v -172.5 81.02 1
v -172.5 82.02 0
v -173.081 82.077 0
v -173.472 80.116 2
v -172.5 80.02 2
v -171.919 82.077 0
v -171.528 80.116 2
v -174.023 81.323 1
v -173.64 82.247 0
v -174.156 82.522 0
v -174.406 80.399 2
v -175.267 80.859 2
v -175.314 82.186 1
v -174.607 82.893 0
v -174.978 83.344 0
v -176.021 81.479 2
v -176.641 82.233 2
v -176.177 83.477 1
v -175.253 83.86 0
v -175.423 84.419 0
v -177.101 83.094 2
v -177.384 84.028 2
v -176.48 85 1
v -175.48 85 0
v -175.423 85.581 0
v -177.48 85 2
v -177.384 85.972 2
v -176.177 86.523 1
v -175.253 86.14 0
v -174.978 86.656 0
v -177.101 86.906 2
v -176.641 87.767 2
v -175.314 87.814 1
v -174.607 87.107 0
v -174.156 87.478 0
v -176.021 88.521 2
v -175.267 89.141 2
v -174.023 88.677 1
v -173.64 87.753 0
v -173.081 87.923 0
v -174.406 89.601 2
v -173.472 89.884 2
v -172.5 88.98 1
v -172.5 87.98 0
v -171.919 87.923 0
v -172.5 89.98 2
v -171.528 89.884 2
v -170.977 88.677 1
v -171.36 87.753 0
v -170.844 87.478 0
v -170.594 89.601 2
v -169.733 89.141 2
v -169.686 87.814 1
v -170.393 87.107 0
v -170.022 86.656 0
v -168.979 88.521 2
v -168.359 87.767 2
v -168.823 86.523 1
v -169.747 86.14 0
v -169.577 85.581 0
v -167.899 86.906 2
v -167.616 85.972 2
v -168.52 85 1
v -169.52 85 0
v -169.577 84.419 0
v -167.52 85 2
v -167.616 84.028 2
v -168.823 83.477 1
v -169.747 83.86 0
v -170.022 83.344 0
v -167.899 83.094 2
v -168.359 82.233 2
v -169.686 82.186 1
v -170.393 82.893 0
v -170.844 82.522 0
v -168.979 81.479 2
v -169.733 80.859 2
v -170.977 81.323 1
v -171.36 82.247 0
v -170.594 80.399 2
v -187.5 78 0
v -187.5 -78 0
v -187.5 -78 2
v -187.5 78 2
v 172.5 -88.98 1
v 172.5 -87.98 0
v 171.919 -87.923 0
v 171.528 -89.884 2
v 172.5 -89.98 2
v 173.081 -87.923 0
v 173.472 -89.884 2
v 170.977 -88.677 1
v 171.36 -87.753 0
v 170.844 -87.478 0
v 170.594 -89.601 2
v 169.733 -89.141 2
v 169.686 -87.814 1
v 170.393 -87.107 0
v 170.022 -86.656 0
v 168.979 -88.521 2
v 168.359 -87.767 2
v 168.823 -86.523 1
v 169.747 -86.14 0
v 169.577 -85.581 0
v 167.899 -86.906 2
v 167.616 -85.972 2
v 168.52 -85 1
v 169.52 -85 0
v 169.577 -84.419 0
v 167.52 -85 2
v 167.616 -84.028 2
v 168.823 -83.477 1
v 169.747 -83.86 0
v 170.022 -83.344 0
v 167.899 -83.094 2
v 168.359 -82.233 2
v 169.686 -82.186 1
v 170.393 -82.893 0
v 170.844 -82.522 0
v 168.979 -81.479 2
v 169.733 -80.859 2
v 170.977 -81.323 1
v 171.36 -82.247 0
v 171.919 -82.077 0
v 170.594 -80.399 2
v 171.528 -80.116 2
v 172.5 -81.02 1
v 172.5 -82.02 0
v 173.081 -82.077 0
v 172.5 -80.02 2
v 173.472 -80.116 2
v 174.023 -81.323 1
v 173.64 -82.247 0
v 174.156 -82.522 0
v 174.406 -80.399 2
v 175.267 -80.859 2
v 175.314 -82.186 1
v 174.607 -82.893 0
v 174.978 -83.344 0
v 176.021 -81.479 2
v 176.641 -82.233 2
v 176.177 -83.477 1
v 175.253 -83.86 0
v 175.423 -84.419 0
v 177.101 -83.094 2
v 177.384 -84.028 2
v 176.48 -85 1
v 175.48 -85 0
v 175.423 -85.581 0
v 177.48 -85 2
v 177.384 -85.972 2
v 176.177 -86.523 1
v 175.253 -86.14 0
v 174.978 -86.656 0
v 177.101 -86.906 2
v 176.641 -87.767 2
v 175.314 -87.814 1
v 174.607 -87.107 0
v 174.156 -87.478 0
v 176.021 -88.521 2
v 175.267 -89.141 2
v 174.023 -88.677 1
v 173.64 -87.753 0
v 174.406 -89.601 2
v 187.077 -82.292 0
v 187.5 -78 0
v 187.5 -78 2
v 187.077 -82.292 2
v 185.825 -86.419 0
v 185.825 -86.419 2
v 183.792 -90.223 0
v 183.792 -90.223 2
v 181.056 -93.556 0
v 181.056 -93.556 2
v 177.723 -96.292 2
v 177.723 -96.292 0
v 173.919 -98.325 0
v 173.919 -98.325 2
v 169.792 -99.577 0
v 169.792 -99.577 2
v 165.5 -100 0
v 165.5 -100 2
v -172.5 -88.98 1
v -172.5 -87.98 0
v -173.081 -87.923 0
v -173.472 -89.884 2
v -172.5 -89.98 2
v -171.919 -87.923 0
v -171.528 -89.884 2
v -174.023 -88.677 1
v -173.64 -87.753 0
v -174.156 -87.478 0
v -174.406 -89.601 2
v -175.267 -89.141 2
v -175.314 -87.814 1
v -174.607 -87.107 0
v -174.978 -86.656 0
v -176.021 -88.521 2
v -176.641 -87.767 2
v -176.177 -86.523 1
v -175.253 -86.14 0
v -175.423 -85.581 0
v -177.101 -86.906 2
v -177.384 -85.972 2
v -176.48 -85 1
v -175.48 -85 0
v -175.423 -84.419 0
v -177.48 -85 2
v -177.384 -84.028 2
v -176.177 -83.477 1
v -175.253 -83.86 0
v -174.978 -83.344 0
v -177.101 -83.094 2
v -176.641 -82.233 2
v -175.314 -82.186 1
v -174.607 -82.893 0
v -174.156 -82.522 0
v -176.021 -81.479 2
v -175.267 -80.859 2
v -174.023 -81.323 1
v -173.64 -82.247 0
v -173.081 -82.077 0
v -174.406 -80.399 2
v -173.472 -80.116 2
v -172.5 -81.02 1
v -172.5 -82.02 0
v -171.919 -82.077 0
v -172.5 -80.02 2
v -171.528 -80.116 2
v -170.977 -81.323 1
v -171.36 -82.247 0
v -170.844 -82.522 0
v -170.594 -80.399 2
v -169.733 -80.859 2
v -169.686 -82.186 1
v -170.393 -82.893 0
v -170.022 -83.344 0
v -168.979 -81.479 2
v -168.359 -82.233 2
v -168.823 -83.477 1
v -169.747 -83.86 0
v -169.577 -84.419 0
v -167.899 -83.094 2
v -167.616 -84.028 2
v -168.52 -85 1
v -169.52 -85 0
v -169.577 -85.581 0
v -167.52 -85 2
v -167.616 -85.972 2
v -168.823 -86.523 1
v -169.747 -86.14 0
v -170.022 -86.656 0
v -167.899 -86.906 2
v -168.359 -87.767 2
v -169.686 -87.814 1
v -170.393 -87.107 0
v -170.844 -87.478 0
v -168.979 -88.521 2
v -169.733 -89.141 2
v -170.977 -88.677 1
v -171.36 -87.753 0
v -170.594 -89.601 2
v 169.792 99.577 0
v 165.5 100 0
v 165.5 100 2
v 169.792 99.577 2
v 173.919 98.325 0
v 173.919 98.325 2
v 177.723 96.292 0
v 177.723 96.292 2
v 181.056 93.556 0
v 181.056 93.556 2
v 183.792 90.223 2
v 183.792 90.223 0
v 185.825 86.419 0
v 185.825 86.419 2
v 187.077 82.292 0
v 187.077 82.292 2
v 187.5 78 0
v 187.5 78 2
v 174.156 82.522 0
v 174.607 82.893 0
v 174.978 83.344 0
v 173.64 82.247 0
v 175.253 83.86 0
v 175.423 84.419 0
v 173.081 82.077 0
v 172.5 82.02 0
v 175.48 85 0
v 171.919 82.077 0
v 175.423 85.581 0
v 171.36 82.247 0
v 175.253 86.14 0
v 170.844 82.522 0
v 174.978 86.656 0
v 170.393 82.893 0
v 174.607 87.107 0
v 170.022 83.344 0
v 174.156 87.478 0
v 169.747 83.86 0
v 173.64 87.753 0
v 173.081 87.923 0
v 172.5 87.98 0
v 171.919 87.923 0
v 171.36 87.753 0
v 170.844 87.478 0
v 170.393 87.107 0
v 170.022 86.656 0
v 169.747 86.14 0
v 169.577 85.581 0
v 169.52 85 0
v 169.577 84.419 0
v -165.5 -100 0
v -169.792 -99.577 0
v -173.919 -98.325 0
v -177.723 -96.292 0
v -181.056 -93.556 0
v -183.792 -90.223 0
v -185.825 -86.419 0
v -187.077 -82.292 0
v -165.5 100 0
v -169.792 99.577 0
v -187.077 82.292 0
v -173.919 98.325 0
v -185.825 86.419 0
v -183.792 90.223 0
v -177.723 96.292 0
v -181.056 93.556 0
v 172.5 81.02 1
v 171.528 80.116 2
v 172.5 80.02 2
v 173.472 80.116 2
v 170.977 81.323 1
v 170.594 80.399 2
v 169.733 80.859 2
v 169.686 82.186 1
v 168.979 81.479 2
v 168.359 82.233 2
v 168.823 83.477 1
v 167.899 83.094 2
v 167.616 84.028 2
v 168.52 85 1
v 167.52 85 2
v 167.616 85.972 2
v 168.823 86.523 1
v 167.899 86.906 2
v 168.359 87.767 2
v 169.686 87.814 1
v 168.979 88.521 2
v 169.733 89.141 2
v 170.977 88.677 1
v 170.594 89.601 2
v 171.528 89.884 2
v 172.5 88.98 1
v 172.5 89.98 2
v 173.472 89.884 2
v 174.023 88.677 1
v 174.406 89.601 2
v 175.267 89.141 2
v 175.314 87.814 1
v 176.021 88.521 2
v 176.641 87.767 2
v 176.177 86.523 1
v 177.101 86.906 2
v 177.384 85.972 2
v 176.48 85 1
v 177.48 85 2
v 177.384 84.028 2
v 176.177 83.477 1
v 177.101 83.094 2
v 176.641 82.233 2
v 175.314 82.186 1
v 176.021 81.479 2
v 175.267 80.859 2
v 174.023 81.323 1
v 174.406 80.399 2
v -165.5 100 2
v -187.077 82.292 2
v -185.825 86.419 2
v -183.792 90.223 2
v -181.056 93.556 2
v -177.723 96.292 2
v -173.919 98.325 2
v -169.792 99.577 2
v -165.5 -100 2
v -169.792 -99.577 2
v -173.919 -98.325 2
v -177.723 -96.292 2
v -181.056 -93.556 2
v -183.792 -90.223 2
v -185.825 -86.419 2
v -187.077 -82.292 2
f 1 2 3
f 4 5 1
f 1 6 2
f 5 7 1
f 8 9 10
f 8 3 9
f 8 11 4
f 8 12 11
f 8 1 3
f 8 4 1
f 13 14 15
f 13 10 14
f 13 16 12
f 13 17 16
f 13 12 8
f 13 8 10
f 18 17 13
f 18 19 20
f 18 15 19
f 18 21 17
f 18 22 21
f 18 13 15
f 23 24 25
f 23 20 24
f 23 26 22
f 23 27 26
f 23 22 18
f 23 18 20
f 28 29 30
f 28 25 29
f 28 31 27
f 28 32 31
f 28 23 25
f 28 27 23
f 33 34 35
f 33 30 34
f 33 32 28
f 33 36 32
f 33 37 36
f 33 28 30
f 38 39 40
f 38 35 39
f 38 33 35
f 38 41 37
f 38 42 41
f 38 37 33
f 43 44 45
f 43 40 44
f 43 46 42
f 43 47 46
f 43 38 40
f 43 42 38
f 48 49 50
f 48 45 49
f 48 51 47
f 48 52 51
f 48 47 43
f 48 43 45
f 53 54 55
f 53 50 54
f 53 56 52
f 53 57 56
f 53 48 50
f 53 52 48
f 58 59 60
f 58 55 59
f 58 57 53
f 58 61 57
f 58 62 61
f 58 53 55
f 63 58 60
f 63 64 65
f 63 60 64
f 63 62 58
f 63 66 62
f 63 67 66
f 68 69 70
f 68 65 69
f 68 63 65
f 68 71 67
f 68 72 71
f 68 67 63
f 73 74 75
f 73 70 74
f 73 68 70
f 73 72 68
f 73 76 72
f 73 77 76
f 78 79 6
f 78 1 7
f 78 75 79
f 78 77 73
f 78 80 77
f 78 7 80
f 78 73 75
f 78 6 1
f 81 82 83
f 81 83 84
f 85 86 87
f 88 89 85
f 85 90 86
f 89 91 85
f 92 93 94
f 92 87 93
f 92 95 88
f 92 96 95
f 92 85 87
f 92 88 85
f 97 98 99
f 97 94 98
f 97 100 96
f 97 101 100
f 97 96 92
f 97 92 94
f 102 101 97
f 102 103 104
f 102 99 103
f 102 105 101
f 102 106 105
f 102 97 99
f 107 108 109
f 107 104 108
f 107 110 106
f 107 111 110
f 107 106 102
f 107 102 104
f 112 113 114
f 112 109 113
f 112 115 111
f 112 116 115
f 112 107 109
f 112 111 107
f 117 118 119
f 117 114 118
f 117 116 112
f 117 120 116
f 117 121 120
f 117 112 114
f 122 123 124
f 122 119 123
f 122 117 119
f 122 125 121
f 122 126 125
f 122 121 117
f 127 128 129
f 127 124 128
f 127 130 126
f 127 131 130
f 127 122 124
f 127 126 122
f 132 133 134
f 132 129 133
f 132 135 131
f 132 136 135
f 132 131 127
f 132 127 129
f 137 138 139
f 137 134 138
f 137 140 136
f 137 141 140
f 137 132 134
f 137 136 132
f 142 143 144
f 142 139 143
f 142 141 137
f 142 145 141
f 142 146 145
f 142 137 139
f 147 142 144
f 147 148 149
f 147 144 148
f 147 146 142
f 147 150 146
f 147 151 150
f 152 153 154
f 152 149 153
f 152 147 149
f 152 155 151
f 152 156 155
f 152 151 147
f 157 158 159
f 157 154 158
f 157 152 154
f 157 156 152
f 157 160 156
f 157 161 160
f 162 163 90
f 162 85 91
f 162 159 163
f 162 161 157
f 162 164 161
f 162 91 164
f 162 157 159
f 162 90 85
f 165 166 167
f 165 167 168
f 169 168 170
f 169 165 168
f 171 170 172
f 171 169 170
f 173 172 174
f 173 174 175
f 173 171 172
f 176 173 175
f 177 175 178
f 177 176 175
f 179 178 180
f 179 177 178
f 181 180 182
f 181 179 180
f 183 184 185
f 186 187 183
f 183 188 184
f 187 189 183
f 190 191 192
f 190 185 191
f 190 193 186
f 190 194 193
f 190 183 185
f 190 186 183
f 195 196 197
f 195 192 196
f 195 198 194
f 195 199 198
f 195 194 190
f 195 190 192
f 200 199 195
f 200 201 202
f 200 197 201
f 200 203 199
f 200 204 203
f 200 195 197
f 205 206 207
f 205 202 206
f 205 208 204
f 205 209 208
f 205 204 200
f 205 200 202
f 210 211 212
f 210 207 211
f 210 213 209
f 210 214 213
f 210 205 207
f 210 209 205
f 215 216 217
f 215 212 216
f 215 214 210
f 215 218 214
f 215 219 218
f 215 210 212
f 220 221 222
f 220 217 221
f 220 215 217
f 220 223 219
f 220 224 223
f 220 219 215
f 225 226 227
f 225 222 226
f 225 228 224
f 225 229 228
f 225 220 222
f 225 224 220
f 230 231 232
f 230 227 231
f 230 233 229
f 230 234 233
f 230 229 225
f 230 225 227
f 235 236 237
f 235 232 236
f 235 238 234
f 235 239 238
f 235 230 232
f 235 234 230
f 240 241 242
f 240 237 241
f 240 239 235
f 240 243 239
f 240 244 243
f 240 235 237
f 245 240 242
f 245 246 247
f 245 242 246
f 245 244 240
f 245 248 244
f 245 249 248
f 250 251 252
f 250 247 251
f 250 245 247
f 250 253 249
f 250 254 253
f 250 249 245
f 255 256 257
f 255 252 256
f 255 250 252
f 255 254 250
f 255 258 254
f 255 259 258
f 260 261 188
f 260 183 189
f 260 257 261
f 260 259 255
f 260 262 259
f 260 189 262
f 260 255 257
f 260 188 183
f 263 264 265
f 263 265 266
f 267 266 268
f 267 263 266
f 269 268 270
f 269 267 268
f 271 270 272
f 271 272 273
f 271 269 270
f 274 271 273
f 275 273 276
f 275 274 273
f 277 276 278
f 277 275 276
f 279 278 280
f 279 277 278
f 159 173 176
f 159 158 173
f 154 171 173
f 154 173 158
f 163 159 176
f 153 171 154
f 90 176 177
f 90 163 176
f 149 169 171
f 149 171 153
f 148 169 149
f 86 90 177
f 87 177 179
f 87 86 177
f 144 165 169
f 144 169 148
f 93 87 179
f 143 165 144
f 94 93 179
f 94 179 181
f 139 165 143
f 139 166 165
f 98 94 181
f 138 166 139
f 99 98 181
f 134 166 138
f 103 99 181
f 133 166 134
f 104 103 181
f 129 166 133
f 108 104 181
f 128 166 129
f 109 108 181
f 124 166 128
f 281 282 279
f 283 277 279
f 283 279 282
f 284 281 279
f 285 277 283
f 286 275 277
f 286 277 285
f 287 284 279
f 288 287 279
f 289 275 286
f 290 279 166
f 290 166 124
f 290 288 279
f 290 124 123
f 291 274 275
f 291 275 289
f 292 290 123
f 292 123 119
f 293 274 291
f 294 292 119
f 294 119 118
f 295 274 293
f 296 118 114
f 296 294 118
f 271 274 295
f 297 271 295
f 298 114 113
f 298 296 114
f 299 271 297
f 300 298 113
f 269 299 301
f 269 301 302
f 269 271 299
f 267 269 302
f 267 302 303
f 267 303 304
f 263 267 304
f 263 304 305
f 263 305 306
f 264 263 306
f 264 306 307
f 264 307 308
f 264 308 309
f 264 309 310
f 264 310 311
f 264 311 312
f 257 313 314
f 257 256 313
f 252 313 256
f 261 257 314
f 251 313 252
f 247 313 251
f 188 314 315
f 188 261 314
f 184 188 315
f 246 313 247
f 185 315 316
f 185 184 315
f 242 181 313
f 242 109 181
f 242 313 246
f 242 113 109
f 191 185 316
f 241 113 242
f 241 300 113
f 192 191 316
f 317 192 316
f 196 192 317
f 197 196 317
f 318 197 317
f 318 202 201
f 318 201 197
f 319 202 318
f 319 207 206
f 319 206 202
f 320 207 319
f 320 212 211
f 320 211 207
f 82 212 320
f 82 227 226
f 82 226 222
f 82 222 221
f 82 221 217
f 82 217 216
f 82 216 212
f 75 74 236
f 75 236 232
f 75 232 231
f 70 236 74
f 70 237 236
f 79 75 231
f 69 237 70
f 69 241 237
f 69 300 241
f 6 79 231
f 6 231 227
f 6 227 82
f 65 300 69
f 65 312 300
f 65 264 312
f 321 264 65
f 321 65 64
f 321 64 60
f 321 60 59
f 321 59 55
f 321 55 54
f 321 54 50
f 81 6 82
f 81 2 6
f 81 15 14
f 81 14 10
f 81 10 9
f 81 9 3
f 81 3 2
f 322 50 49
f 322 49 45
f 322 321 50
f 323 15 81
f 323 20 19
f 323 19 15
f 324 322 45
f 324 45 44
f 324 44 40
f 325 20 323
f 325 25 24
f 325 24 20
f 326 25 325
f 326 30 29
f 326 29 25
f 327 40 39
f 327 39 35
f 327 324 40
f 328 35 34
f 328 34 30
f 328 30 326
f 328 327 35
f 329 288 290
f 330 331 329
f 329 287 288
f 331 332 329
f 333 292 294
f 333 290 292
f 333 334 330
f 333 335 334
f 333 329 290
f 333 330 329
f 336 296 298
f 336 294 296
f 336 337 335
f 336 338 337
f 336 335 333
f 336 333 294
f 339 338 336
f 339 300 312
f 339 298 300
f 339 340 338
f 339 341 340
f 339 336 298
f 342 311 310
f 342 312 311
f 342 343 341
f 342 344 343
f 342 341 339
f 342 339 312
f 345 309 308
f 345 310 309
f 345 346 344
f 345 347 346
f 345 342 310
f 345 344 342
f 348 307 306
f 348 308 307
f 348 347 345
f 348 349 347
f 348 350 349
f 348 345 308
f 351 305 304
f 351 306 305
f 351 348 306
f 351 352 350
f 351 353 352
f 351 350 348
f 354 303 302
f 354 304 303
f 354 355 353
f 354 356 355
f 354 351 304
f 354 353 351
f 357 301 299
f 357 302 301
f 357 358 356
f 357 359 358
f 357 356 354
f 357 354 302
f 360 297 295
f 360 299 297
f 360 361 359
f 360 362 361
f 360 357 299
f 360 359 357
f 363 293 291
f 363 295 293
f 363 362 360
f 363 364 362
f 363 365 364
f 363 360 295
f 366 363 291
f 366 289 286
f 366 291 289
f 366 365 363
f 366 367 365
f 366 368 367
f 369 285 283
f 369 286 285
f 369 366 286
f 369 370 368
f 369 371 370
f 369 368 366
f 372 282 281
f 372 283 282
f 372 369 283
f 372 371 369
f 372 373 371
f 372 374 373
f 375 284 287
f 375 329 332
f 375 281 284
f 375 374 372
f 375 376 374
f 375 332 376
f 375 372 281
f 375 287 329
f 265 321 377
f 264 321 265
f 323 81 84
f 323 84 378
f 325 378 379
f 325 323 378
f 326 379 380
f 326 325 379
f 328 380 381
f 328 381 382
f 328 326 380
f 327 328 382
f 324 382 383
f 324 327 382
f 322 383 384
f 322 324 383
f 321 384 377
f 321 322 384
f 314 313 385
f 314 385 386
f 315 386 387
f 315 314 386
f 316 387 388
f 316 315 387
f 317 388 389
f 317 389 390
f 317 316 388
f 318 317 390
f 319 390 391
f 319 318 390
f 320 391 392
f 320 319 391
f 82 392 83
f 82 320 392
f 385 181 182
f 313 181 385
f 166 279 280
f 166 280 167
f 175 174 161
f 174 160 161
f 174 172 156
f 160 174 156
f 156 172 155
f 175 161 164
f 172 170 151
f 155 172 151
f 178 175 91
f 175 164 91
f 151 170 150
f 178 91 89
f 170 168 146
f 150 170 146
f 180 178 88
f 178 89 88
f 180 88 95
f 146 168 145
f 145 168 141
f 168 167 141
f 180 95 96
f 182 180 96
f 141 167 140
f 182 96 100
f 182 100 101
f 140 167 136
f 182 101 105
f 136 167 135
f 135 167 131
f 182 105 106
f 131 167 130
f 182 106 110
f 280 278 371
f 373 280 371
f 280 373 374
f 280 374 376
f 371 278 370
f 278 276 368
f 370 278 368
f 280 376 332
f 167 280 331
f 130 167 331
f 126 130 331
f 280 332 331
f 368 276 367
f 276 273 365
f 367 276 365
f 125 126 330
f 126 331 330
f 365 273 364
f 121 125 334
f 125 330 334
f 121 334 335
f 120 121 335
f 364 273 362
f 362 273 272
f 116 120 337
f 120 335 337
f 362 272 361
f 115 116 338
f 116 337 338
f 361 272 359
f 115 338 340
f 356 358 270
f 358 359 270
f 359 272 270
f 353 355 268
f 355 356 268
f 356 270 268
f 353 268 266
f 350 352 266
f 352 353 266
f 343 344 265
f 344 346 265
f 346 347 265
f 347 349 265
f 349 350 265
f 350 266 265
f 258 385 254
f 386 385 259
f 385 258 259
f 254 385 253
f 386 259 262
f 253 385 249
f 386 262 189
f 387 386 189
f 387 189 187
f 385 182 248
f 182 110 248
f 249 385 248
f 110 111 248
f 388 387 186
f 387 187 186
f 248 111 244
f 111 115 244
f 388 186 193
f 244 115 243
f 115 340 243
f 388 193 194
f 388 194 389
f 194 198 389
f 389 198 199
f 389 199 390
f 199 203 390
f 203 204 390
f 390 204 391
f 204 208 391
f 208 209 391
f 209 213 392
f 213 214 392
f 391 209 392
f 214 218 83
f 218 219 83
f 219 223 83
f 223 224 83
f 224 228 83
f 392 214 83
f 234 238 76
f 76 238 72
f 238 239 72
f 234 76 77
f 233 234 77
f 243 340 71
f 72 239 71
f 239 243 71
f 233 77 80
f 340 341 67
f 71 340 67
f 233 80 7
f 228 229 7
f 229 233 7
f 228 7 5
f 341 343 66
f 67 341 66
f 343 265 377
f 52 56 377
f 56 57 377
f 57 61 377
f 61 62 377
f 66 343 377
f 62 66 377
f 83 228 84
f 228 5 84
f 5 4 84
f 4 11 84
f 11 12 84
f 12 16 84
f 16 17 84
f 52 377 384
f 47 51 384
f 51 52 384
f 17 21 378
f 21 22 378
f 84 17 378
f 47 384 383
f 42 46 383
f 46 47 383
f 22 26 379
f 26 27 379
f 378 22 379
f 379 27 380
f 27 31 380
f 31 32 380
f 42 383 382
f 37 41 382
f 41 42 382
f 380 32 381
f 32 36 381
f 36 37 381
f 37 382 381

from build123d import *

# Parameters (mm, degrees)
BASE_FLANGE1_DEPTH                           = 2
ESBO_O7_R                                    = 1.5
CORTE_EXTRUS_O1_DEPTH                        = 213.509411556
ESCAREADO_PARA_PARAFUSO_ALLEN_SEXTAV_2_COUNT = 2
ESCAREADO_PARA_PARAFUSO_ALLEN_SEXTAV_2_PITCH = 170
ESCAREADO_PARA_PARAFUSO_ALLEN_SEXTAV_3_COUNT = 2
ESCAREADO_PARA_PARAFUSO_ALLEN_SEXTAV_3_PITCH = 345
ESCAREADO_PARA_PARAFUSO_ALLEN_SEXTAV_4_COUNT = 2
ESCAREADO_PARA_PARAFUSO_ALLEN_SEXTAV_4_PITCH = 384.610192273


# Sheet-metal steps are written as plain solids
with BuildPart() as part:
    # Sketch1 → Base-Flange1 (new body)
    with BuildSketch(Plane.XY):
        with BuildLine():
            Line((-165.5, 100), (165.5, 100))
            ThreePointArc((165.5, 100), (181.056349186, 93.556349186), (187.5, 78))
            Line((187.5, 78), (187.5, -78))
            ThreePointArc((187.5, -78), (181.056349186, -93.556349186), (165.5, -100))
            Line((165.5, -100), (-165.5, -100))
            ThreePointArc((-165.5, -100), (-181.056349186, -93.556349186), (-187.5, -78))
            Line((-187.5, -78), (-187.5, 78))
            ThreePointArc((-187.5, 78), (-181.056349186, 93.556349186), (-165.5, 100))
        make_face()
    extrude(amount=BASE_FLANGE1_DEPTH)

    # Esboço7 → Corte-extrusão1 (cut, through all)
    with BuildSketch(Plane(origin=(0, 0, 0), x_dir=(-1, 0, 0), z_dir=(0, 0, -1))):
        with Locations((-172.5, 85)):
            Circle(ESBO_O7_R)
        with Locations((172.5, 85)):
            Circle(ESBO_O7_R)
        with Locations((-172.5, -85)):
            Circle(ESBO_O7_R)
        with Locations((172.5, -85)):
            Circle(ESBO_O7_R)
    extrude(amount=-CORTE_EXTRUS_O1_DEPTH, mode=Mode.SUBTRACT)

    # Esboço9 → Escareado para parafuso Allen sextavado escareado de M41 (revolve, cut)
    with BuildSketch(Plane(origin=(-172.5, 85, 2), x_dir=(0, -1, 0), z_dir=(1, 0, 0))):
        Polygon((0, 0), (0, 2), (2.15, 2), (2.15, 2.83), (4.98, 0), align=None)
    escareado_para_parafuso_allen_sextavado = revolve(axis=Axis((-172.5, 85, 8.35), (0, 0, -1)), mode=Mode.SUBTRACT)

    # Escareado para parafuso Allen sextav 2: Escareado para parafuso Allen sextavado escareado de M41 ×2
    with Locations(*[(0, -i * ESCAREADO_PARA_PARAFUSO_ALLEN_SEXTAV_2_PITCH, 0) for i in range(1, ESCAREADO_PARA_PARAFUSO_ALLEN_SEXTAV_2_COUNT)]):
        add(escareado_para_parafuso_allen_sextavado, mode=Mode.SUBTRACT)

    # Escareado para parafuso Allen sextav 3: Escareado para parafuso Allen sextavado escareado de M41 ×2
    with Locations(*[(i * ESCAREADO_PARA_PARAFUSO_ALLEN_SEXTAV_3_PITCH, 0, 0) for i in range(1, ESCAREADO_PARA_PARAFUSO_ALLEN_SEXTAV_3_COUNT)]):
        add(escareado_para_parafuso_allen_sextavado, mode=Mode.SUBTRACT)

    # Escareado para parafuso Allen sextav 4: Escareado para parafuso Allen sextavado escareado de M41 ×2
    with Locations(*[Vector(0.8970121097452229, -0.44200596712083445, 0) * (i * ESCAREADO_PARA_PARAFUSO_ALLEN_SEXTAV_4_PITCH) for i in range(1, ESCAREADO_PARA_PARAFUSO_ALLEN_SEXTAV_4_COUNT)]):
        add(escareado_para_parafuso_allen_sextavado, mode=Mode.SUBTRACT)


solid = part.part
